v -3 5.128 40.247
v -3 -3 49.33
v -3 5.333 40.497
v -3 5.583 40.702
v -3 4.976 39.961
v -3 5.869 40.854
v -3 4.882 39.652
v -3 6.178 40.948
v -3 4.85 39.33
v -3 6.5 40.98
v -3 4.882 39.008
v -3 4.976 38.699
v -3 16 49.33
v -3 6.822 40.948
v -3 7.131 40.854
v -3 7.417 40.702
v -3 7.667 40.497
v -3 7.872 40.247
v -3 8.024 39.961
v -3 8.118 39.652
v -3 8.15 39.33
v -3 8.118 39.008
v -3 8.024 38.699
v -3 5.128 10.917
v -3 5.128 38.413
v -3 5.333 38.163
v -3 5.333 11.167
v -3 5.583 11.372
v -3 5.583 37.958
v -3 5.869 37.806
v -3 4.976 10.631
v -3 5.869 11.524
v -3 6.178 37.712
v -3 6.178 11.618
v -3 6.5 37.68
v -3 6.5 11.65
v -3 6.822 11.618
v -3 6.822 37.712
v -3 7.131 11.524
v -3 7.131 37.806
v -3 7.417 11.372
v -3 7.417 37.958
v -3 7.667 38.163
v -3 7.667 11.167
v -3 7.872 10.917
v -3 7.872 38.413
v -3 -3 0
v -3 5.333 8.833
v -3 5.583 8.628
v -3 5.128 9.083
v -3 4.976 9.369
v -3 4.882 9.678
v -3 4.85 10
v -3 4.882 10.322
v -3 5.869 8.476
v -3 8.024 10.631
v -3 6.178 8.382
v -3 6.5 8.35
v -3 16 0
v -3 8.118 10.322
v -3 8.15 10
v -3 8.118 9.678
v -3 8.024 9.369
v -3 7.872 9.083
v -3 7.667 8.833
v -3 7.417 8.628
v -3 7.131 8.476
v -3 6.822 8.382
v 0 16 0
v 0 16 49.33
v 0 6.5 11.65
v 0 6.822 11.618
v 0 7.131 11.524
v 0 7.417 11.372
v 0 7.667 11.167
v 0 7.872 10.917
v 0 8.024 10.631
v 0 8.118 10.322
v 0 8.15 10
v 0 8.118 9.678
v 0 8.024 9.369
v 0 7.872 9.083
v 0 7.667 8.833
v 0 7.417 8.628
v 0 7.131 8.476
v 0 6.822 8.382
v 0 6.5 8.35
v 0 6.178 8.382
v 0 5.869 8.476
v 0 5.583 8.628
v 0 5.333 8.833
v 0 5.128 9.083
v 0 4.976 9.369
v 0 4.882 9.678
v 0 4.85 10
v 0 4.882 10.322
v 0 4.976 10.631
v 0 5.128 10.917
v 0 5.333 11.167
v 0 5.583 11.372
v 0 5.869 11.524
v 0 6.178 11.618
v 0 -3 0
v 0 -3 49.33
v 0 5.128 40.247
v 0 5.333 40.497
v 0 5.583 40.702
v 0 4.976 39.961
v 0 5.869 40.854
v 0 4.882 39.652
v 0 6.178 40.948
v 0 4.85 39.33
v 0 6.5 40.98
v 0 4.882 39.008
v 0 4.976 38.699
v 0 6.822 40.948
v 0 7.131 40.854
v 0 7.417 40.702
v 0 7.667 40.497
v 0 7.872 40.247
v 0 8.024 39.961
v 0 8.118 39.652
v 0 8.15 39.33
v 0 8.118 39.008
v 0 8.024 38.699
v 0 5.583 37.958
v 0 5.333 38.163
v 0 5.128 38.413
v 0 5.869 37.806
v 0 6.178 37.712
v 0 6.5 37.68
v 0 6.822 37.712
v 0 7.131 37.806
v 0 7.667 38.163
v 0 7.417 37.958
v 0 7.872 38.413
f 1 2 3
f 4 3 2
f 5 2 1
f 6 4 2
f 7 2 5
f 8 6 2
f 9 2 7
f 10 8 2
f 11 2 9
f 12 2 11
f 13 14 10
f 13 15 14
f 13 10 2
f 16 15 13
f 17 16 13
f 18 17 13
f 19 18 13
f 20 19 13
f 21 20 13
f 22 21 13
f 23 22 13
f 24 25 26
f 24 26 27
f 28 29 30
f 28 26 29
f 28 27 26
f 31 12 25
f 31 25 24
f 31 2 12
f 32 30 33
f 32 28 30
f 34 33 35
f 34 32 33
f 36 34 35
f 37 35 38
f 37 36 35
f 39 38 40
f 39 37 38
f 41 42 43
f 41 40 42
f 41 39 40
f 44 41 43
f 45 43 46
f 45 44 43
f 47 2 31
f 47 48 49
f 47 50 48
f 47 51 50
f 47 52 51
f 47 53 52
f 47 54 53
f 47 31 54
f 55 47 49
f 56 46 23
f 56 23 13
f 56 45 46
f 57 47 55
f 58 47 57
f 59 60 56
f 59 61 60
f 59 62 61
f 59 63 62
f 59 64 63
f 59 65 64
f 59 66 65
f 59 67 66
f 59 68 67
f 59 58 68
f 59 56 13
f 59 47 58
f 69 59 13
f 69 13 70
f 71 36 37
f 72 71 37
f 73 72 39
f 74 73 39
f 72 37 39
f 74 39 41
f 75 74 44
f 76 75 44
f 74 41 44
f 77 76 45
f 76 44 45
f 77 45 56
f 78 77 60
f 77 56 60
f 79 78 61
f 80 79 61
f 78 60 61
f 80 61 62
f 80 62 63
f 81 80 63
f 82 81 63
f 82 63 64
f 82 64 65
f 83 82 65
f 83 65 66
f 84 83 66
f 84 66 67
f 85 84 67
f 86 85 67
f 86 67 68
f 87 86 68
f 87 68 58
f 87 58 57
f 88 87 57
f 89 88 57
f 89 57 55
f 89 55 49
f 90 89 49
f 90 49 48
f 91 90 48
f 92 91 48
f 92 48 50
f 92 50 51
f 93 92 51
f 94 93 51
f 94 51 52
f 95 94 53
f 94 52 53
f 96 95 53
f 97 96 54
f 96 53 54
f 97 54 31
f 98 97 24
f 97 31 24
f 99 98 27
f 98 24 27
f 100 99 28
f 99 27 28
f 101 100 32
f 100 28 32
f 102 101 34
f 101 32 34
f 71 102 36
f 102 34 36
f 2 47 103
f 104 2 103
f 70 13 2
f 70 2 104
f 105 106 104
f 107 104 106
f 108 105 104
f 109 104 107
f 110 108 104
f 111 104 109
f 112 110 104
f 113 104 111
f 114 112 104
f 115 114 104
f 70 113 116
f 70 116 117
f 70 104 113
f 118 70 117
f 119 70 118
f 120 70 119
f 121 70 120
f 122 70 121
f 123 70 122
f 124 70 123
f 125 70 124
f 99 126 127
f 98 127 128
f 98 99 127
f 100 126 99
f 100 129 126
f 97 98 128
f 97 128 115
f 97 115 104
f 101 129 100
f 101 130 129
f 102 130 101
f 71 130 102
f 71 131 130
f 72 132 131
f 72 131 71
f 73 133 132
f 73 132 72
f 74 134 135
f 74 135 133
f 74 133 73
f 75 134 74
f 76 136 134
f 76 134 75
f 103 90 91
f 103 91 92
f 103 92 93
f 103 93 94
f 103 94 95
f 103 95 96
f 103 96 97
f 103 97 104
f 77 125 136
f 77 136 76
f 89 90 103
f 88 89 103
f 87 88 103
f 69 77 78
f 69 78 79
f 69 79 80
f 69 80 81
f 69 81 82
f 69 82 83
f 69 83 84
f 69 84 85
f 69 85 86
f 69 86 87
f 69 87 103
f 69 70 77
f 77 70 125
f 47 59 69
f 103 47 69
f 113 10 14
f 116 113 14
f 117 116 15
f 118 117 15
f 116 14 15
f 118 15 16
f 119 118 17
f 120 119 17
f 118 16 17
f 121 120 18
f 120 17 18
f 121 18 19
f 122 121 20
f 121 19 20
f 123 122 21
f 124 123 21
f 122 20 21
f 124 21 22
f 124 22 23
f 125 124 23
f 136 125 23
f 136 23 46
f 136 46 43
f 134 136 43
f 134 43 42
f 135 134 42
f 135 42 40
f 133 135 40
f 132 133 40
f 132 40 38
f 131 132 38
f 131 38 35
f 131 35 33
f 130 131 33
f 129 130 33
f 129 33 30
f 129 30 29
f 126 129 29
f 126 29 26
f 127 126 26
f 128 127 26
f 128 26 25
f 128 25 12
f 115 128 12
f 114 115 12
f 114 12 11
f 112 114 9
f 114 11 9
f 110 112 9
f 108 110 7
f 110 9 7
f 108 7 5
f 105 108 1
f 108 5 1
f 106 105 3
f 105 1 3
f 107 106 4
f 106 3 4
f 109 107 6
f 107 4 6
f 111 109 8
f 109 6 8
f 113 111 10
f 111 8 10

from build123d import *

# Parameters (mm, degrees)
SKETCH_1_W          = 19
SKETCH_1_H          = 19
SKETCH_1_W_2        = 13
SKETCH_1_H_2        = 13
EXTRUDE_1_DEPTH     = 49.33
SKETCH_2_R          = 1.65
CUT_EXTRUDE_1_DEPTH = 30
SKETCH_3_W          = 49.33
SKETCH_3_H          = 19
CUT_EXTRUDE_2_DEPTH = 16


with BuildPart() as part:
    # 草图1 → Extrude 1 (new body)
    with BuildSketch(Plane.XY):
        with Locations((6.5, 6.5)):
            Rectangle(SKETCH_1_W, SKETCH_1_H)
        with Locations((6.5, 6.5)):
            Rectangle(SKETCH_1_W_2, SKETCH_1_H_2, mode=Mode.SUBTRACT)
    extrude(amount=EXTRUDE_1_DEPTH)

    # 草图2 → 切除-拉伸1 (cut)
    with BuildSketch(Plane.ZY.offset(3)):
        with Locations((10, 6.5)):
            Circle(SKETCH_2_R)
        with Locations((39.33, 6.5)):
            Circle(SKETCH_2_R)
    extrude(amount=-CUT_EXTRUDE_1_DEPTH, mode=Mode.SUBTRACT)

    # 草图3 → 切除-拉伸2 (cut)
    with BuildSketch(Plane(origin=(16, 0, 0), x_dir=(0, 0, -1), z_dir=(1, 0, 0))):
        with Locations((-24.665, 6.5)):
            Rectangle(SKETCH_3_W, SKETCH_3_H)
    extrude(amount=-CUT_EXTRUDE_2_DEPTH, mode=Mode.SUBTRACT)


solid = part.part
